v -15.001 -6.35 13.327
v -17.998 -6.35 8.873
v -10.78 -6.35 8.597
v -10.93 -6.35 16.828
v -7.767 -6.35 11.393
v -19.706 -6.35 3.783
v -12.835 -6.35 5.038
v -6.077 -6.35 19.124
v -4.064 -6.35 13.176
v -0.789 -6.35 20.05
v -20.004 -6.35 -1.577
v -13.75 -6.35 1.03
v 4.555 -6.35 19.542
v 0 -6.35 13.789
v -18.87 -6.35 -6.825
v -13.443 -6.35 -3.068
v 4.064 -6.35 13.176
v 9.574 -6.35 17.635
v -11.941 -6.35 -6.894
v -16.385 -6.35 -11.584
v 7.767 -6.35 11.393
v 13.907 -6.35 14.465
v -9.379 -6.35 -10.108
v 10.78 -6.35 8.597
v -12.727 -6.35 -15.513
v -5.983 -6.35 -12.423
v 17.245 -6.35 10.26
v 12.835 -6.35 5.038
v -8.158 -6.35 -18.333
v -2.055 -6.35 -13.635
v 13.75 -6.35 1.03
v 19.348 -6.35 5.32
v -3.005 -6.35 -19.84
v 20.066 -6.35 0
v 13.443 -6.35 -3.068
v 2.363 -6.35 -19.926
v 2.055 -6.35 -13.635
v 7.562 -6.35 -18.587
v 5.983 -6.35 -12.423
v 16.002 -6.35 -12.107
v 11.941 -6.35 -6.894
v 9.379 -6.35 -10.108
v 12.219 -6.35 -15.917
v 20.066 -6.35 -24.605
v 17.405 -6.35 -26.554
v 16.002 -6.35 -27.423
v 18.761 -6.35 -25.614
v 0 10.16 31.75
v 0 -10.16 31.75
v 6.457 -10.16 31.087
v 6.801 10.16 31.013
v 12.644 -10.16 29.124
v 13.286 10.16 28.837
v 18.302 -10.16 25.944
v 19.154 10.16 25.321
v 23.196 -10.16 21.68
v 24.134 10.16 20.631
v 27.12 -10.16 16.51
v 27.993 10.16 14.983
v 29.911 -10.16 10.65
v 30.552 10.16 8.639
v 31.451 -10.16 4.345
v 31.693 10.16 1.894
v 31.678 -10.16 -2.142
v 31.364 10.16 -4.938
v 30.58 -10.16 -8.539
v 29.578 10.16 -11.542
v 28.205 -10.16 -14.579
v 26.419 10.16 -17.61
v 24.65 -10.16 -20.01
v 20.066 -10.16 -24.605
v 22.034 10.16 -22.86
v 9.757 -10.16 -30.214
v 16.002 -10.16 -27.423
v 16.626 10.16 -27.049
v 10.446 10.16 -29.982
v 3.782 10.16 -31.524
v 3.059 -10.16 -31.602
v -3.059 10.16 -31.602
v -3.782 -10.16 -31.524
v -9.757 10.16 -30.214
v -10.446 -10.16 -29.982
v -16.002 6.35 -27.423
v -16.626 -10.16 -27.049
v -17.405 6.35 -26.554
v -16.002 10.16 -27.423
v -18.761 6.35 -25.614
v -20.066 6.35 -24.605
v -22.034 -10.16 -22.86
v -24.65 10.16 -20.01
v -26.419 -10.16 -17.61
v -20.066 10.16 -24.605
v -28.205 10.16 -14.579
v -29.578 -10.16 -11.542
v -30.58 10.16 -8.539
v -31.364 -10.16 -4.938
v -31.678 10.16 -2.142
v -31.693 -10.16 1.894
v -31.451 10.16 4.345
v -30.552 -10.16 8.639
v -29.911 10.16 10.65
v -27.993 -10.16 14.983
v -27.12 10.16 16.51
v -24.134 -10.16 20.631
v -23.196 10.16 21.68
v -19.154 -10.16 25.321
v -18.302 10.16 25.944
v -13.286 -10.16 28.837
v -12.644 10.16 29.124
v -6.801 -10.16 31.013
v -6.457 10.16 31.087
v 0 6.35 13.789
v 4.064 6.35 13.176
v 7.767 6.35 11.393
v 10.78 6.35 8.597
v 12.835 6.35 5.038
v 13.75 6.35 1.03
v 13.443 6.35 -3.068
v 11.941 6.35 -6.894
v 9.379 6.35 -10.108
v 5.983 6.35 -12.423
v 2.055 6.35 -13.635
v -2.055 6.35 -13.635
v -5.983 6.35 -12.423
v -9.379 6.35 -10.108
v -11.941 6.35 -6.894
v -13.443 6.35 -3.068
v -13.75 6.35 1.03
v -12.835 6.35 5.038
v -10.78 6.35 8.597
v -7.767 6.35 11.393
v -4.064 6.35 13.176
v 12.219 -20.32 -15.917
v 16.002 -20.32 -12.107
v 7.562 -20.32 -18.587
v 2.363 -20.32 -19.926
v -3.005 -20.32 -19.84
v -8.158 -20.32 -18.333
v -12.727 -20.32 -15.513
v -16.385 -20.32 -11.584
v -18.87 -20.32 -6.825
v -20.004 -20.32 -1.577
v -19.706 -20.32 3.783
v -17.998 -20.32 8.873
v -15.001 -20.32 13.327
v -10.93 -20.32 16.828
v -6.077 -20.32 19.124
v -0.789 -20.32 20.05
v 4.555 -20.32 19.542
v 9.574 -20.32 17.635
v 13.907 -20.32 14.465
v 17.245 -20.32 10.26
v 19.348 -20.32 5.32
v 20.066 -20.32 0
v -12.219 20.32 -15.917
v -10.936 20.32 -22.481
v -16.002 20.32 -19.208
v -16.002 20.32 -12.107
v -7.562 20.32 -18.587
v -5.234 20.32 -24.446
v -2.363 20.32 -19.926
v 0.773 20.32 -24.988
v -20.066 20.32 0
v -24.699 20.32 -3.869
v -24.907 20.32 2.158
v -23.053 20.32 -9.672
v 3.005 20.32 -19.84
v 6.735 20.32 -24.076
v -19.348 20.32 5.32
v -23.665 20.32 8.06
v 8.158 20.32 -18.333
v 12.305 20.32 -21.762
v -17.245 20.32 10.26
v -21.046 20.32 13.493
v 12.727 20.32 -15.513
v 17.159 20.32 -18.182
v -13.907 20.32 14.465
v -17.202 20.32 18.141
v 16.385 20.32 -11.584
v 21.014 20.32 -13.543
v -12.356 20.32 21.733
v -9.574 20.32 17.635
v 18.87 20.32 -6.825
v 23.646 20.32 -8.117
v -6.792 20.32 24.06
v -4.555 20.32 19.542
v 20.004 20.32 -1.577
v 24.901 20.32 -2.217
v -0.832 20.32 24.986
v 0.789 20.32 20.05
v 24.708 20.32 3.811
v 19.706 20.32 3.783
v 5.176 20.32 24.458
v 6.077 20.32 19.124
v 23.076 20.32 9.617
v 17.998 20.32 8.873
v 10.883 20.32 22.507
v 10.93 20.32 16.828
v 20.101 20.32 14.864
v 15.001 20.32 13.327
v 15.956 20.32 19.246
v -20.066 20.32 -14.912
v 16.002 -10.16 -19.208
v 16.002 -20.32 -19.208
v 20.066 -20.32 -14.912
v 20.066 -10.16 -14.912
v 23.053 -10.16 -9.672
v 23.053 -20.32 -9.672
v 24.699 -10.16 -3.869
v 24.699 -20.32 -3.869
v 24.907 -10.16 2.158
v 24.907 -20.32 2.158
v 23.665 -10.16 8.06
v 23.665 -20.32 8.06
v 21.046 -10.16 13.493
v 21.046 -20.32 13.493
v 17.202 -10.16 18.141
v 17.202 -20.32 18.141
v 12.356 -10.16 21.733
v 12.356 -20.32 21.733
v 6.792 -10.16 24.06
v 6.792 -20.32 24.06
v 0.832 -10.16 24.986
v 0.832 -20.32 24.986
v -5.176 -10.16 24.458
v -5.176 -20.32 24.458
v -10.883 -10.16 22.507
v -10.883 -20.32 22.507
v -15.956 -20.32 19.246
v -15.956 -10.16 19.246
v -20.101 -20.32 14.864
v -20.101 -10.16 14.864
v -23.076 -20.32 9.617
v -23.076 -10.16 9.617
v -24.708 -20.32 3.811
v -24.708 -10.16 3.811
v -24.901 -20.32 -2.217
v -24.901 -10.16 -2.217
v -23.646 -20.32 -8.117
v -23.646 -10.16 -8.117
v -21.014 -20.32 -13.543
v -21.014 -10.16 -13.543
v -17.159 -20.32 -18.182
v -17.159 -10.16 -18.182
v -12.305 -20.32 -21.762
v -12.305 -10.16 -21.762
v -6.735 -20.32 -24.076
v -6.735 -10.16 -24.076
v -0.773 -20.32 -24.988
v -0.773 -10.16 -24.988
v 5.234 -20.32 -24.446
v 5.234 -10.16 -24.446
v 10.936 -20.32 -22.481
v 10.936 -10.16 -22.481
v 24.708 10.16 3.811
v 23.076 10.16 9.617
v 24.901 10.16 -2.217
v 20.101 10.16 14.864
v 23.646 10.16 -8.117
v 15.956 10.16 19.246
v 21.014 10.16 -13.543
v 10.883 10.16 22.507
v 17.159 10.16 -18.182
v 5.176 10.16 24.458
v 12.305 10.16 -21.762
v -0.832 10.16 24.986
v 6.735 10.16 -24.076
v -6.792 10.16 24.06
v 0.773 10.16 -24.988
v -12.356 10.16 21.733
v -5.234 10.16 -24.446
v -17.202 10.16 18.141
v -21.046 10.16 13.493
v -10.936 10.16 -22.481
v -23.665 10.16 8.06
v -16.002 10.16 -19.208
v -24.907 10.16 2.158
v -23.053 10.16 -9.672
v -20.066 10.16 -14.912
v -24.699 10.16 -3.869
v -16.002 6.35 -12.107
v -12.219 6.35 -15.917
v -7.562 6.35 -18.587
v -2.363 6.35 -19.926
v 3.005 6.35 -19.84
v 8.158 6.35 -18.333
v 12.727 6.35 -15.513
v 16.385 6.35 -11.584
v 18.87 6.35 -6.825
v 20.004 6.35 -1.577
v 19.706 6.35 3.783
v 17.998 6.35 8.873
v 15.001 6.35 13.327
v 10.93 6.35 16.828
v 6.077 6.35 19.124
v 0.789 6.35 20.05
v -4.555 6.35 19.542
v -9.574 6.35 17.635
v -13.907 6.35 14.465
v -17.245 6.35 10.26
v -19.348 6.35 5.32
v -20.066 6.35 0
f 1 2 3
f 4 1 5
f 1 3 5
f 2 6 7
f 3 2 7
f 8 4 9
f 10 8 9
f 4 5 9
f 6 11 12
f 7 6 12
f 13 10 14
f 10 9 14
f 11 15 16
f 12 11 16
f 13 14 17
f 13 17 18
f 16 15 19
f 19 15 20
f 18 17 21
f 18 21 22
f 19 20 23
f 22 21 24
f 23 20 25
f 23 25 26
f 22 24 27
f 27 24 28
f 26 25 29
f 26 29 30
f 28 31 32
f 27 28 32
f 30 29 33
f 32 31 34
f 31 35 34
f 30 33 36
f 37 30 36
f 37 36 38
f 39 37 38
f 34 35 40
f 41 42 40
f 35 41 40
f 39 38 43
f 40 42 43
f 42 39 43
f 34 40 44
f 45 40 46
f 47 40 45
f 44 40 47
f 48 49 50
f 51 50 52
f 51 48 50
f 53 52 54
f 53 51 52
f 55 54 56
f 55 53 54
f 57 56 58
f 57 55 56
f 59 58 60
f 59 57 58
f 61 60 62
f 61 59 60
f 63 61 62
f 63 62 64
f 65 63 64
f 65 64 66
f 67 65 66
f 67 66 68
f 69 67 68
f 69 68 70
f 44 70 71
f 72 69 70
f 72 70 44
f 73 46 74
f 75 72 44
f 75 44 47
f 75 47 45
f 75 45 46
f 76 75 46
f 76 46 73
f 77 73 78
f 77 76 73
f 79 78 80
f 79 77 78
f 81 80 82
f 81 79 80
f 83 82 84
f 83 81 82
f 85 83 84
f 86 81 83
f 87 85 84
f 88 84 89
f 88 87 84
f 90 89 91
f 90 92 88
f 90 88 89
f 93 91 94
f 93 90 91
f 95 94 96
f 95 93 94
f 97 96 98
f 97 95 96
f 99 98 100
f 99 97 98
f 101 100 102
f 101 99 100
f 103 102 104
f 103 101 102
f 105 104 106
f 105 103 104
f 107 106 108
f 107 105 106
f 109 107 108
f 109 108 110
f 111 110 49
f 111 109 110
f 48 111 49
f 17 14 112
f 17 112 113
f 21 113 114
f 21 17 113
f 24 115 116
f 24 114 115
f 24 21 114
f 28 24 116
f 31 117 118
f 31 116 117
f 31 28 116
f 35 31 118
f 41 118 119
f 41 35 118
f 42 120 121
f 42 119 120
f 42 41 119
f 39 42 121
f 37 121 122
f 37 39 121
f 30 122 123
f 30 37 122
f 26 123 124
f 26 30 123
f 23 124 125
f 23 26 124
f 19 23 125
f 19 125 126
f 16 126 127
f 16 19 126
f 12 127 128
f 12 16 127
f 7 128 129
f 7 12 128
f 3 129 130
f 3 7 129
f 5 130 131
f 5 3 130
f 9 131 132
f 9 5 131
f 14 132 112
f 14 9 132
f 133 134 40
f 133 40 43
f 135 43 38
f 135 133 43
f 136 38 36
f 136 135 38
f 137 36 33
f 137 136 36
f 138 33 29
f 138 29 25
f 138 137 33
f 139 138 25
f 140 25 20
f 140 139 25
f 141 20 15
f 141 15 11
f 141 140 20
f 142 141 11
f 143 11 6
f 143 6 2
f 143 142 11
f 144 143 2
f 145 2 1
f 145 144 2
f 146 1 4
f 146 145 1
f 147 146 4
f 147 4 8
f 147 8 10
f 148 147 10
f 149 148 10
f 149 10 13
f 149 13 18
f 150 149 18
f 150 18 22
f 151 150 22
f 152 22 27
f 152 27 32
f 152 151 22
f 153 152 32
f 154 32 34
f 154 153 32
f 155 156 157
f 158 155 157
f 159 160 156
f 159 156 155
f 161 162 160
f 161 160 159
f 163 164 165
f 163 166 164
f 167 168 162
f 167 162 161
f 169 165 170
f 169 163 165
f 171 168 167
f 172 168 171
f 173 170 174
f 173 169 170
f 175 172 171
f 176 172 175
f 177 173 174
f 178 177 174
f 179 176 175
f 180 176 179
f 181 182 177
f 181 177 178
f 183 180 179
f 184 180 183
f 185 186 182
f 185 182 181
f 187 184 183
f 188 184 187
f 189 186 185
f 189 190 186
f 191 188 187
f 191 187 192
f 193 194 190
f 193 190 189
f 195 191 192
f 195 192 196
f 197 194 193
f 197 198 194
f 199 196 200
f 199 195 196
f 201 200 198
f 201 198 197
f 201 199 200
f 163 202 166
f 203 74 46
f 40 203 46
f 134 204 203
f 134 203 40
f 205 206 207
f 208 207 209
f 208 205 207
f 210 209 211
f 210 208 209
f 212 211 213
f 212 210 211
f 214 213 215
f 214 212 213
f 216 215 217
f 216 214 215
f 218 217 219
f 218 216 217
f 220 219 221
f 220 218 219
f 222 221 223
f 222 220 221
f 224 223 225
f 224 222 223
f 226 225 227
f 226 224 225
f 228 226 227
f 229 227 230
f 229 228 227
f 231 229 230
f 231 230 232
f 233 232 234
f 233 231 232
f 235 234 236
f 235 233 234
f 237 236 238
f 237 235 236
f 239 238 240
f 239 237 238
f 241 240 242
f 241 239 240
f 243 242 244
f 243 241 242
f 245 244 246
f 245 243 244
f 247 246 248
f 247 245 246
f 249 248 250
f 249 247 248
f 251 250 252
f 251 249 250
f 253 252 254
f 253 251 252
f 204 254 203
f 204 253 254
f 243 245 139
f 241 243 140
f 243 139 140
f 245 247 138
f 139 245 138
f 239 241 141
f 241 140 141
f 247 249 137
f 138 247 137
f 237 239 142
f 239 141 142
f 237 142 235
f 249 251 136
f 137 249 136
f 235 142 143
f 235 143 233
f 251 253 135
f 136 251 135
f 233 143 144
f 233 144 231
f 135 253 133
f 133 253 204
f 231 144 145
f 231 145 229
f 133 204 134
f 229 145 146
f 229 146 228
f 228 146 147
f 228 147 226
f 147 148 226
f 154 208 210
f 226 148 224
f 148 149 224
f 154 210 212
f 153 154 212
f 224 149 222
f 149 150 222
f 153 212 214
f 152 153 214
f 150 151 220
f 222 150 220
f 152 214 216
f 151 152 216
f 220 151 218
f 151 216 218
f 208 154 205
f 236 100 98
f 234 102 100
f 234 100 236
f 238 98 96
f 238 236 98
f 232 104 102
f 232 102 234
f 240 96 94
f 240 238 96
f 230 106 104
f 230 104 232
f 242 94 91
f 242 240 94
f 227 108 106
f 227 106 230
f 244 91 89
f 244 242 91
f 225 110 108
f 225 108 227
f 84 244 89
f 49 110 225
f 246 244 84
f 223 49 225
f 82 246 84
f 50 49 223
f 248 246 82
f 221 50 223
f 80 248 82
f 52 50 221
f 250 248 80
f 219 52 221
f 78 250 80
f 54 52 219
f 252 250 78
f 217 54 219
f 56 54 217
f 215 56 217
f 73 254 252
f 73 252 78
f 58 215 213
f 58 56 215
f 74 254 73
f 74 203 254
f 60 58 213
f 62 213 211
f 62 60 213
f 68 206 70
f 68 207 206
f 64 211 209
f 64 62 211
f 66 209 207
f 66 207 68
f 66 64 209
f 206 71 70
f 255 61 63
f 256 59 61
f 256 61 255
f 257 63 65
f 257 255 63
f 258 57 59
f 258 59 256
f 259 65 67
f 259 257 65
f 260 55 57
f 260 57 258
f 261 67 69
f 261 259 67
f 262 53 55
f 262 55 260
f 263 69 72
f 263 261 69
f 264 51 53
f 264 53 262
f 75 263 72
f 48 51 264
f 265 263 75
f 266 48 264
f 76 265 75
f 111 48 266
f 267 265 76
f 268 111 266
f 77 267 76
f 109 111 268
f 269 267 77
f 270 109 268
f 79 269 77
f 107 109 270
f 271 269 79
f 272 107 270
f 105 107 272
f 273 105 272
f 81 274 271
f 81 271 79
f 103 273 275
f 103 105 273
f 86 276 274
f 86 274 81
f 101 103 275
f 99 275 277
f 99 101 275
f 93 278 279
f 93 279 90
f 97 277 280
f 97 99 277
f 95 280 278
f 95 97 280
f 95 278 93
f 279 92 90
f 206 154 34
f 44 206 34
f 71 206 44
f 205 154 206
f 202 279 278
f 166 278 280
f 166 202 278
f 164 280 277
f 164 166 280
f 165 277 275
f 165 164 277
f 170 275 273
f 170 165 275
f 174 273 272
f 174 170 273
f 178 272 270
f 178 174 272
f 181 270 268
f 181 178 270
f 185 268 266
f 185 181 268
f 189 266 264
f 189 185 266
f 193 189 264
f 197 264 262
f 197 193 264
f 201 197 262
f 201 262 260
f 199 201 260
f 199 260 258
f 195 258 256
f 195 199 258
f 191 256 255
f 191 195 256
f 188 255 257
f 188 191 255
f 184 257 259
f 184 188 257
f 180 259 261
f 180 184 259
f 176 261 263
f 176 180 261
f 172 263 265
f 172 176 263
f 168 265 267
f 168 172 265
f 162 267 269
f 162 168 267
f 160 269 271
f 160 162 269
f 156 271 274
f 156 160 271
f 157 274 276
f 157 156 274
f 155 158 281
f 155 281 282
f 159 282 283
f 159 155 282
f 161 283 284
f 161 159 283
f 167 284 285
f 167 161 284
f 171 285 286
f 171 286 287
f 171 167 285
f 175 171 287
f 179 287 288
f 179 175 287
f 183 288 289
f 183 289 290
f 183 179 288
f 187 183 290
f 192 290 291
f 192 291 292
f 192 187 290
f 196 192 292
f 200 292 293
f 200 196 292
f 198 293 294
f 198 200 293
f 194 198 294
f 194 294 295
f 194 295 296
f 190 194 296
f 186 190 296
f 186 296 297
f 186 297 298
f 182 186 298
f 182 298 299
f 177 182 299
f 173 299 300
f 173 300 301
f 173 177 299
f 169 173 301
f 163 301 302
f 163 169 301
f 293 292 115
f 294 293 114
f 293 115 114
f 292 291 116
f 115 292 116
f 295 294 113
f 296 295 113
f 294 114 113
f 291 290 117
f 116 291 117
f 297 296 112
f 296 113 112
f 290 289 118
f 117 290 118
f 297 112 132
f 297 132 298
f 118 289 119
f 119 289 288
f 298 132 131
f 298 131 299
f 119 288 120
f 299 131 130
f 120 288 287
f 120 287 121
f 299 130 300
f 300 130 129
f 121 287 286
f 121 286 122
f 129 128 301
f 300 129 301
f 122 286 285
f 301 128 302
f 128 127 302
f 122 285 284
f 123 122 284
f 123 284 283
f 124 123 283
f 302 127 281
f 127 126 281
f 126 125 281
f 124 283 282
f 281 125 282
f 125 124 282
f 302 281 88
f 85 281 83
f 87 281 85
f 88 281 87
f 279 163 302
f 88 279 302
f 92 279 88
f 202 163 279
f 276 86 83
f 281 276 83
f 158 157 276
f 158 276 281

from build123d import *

# Parameters (mm, degrees)
SKETCH1_R           = 31.75
SKETCH1_R_2         = 13.788571429
BOSS_EXTRUDE1_DEPTH = 20.32
CUT_EXTRUDE1_DEPTH  = 13.97
SKETCH13_R          = 31.75
SKETCH13_R_2        = 25
CUT_EXTRUDE2_DEPTH  = 10.16
CIRPATTERN1_COUNT   = 2


with BuildPart() as part:
    # Sketch1 → Boss-Extrude1 (new, symmetric)
    with BuildSketch(Plane(origin=(0, 0, 0), x_dir=(1, 0, 0), z_dir=(0, 1, 0))):
        with Locations(Location((0, 0, 0), (0, 0, 270))):
            Circle(SKETCH1_R)
        with Locations(Location((0, 0, 0), (0, 0, 270))):
            Circle(SKETCH1_R_2, mode=Mode.SUBTRACT)
    extrude(amount=BOSS_EXTRUDE1_DEPTH, both=True)

    # Sketch2 → Cut-Extrude1 (cut)
    with BuildSketch(Plane(origin=(0, 20.32, 0), x_dir=(1, 0, 0), z_dir=(0, 1, 0))):
        with BuildLine():
            Line((-20.066, 0), (-20.066, 24.60524627))
            ThreePointArc((-20.066, 24.60524627), (-18.088933462, 26.093159759), (-16.002, 27.422590979))
            Line((-16.002, 27.422590979), (-16.002, 12.107037292))
            ThreePointArc((-16.002, 12.107037292), (19.022887373, -6.385460986), (-20.066, 0))
        make_face()
    cut_extrude1 = extrude(amount=-CUT_EXTRUDE1_DEPTH, mode=Mode.SUBTRACT)

    # Sketch13 → Cut-Extrude2 (cut)
    with BuildSketch(Plane(origin=(0, 20.32, 0), x_dir=(1, 0, 0), z_dir=(0, 1, 0))):
        with Locations(Location((0, 0, 0), (0, 0, 120.264992611))):
            Circle(SKETCH13_R)
        Circle(SKETCH13_R_2, mode=Mode.SUBTRACT)
    cut_extrude2 = extrude(amount=-CUT_EXTRUDE2_DEPTH, mode=Mode.SUBTRACT)

    # CirPattern1: Cut-Extrude1, Cut-Extrude2 ×2 about axis
    cirpattern1_axis = Axis((0, 0, 0), (0, 0, 1))
    add([cut_extrude1.rotate(cirpattern1_axis, i * 360 / CIRPATTERN1_COUNT) for i in range(1, CIRPATTERN1_COUNT)], mode=Mode.SUBTRACT)
    add([cut_extrude2.rotate(cirpattern1_axis, i * 360 / CIRPATTERN1_COUNT) for i in range(1, CIRPATTERN1_COUNT)], mode=Mode.SUBTRACT)


solid = part.part
